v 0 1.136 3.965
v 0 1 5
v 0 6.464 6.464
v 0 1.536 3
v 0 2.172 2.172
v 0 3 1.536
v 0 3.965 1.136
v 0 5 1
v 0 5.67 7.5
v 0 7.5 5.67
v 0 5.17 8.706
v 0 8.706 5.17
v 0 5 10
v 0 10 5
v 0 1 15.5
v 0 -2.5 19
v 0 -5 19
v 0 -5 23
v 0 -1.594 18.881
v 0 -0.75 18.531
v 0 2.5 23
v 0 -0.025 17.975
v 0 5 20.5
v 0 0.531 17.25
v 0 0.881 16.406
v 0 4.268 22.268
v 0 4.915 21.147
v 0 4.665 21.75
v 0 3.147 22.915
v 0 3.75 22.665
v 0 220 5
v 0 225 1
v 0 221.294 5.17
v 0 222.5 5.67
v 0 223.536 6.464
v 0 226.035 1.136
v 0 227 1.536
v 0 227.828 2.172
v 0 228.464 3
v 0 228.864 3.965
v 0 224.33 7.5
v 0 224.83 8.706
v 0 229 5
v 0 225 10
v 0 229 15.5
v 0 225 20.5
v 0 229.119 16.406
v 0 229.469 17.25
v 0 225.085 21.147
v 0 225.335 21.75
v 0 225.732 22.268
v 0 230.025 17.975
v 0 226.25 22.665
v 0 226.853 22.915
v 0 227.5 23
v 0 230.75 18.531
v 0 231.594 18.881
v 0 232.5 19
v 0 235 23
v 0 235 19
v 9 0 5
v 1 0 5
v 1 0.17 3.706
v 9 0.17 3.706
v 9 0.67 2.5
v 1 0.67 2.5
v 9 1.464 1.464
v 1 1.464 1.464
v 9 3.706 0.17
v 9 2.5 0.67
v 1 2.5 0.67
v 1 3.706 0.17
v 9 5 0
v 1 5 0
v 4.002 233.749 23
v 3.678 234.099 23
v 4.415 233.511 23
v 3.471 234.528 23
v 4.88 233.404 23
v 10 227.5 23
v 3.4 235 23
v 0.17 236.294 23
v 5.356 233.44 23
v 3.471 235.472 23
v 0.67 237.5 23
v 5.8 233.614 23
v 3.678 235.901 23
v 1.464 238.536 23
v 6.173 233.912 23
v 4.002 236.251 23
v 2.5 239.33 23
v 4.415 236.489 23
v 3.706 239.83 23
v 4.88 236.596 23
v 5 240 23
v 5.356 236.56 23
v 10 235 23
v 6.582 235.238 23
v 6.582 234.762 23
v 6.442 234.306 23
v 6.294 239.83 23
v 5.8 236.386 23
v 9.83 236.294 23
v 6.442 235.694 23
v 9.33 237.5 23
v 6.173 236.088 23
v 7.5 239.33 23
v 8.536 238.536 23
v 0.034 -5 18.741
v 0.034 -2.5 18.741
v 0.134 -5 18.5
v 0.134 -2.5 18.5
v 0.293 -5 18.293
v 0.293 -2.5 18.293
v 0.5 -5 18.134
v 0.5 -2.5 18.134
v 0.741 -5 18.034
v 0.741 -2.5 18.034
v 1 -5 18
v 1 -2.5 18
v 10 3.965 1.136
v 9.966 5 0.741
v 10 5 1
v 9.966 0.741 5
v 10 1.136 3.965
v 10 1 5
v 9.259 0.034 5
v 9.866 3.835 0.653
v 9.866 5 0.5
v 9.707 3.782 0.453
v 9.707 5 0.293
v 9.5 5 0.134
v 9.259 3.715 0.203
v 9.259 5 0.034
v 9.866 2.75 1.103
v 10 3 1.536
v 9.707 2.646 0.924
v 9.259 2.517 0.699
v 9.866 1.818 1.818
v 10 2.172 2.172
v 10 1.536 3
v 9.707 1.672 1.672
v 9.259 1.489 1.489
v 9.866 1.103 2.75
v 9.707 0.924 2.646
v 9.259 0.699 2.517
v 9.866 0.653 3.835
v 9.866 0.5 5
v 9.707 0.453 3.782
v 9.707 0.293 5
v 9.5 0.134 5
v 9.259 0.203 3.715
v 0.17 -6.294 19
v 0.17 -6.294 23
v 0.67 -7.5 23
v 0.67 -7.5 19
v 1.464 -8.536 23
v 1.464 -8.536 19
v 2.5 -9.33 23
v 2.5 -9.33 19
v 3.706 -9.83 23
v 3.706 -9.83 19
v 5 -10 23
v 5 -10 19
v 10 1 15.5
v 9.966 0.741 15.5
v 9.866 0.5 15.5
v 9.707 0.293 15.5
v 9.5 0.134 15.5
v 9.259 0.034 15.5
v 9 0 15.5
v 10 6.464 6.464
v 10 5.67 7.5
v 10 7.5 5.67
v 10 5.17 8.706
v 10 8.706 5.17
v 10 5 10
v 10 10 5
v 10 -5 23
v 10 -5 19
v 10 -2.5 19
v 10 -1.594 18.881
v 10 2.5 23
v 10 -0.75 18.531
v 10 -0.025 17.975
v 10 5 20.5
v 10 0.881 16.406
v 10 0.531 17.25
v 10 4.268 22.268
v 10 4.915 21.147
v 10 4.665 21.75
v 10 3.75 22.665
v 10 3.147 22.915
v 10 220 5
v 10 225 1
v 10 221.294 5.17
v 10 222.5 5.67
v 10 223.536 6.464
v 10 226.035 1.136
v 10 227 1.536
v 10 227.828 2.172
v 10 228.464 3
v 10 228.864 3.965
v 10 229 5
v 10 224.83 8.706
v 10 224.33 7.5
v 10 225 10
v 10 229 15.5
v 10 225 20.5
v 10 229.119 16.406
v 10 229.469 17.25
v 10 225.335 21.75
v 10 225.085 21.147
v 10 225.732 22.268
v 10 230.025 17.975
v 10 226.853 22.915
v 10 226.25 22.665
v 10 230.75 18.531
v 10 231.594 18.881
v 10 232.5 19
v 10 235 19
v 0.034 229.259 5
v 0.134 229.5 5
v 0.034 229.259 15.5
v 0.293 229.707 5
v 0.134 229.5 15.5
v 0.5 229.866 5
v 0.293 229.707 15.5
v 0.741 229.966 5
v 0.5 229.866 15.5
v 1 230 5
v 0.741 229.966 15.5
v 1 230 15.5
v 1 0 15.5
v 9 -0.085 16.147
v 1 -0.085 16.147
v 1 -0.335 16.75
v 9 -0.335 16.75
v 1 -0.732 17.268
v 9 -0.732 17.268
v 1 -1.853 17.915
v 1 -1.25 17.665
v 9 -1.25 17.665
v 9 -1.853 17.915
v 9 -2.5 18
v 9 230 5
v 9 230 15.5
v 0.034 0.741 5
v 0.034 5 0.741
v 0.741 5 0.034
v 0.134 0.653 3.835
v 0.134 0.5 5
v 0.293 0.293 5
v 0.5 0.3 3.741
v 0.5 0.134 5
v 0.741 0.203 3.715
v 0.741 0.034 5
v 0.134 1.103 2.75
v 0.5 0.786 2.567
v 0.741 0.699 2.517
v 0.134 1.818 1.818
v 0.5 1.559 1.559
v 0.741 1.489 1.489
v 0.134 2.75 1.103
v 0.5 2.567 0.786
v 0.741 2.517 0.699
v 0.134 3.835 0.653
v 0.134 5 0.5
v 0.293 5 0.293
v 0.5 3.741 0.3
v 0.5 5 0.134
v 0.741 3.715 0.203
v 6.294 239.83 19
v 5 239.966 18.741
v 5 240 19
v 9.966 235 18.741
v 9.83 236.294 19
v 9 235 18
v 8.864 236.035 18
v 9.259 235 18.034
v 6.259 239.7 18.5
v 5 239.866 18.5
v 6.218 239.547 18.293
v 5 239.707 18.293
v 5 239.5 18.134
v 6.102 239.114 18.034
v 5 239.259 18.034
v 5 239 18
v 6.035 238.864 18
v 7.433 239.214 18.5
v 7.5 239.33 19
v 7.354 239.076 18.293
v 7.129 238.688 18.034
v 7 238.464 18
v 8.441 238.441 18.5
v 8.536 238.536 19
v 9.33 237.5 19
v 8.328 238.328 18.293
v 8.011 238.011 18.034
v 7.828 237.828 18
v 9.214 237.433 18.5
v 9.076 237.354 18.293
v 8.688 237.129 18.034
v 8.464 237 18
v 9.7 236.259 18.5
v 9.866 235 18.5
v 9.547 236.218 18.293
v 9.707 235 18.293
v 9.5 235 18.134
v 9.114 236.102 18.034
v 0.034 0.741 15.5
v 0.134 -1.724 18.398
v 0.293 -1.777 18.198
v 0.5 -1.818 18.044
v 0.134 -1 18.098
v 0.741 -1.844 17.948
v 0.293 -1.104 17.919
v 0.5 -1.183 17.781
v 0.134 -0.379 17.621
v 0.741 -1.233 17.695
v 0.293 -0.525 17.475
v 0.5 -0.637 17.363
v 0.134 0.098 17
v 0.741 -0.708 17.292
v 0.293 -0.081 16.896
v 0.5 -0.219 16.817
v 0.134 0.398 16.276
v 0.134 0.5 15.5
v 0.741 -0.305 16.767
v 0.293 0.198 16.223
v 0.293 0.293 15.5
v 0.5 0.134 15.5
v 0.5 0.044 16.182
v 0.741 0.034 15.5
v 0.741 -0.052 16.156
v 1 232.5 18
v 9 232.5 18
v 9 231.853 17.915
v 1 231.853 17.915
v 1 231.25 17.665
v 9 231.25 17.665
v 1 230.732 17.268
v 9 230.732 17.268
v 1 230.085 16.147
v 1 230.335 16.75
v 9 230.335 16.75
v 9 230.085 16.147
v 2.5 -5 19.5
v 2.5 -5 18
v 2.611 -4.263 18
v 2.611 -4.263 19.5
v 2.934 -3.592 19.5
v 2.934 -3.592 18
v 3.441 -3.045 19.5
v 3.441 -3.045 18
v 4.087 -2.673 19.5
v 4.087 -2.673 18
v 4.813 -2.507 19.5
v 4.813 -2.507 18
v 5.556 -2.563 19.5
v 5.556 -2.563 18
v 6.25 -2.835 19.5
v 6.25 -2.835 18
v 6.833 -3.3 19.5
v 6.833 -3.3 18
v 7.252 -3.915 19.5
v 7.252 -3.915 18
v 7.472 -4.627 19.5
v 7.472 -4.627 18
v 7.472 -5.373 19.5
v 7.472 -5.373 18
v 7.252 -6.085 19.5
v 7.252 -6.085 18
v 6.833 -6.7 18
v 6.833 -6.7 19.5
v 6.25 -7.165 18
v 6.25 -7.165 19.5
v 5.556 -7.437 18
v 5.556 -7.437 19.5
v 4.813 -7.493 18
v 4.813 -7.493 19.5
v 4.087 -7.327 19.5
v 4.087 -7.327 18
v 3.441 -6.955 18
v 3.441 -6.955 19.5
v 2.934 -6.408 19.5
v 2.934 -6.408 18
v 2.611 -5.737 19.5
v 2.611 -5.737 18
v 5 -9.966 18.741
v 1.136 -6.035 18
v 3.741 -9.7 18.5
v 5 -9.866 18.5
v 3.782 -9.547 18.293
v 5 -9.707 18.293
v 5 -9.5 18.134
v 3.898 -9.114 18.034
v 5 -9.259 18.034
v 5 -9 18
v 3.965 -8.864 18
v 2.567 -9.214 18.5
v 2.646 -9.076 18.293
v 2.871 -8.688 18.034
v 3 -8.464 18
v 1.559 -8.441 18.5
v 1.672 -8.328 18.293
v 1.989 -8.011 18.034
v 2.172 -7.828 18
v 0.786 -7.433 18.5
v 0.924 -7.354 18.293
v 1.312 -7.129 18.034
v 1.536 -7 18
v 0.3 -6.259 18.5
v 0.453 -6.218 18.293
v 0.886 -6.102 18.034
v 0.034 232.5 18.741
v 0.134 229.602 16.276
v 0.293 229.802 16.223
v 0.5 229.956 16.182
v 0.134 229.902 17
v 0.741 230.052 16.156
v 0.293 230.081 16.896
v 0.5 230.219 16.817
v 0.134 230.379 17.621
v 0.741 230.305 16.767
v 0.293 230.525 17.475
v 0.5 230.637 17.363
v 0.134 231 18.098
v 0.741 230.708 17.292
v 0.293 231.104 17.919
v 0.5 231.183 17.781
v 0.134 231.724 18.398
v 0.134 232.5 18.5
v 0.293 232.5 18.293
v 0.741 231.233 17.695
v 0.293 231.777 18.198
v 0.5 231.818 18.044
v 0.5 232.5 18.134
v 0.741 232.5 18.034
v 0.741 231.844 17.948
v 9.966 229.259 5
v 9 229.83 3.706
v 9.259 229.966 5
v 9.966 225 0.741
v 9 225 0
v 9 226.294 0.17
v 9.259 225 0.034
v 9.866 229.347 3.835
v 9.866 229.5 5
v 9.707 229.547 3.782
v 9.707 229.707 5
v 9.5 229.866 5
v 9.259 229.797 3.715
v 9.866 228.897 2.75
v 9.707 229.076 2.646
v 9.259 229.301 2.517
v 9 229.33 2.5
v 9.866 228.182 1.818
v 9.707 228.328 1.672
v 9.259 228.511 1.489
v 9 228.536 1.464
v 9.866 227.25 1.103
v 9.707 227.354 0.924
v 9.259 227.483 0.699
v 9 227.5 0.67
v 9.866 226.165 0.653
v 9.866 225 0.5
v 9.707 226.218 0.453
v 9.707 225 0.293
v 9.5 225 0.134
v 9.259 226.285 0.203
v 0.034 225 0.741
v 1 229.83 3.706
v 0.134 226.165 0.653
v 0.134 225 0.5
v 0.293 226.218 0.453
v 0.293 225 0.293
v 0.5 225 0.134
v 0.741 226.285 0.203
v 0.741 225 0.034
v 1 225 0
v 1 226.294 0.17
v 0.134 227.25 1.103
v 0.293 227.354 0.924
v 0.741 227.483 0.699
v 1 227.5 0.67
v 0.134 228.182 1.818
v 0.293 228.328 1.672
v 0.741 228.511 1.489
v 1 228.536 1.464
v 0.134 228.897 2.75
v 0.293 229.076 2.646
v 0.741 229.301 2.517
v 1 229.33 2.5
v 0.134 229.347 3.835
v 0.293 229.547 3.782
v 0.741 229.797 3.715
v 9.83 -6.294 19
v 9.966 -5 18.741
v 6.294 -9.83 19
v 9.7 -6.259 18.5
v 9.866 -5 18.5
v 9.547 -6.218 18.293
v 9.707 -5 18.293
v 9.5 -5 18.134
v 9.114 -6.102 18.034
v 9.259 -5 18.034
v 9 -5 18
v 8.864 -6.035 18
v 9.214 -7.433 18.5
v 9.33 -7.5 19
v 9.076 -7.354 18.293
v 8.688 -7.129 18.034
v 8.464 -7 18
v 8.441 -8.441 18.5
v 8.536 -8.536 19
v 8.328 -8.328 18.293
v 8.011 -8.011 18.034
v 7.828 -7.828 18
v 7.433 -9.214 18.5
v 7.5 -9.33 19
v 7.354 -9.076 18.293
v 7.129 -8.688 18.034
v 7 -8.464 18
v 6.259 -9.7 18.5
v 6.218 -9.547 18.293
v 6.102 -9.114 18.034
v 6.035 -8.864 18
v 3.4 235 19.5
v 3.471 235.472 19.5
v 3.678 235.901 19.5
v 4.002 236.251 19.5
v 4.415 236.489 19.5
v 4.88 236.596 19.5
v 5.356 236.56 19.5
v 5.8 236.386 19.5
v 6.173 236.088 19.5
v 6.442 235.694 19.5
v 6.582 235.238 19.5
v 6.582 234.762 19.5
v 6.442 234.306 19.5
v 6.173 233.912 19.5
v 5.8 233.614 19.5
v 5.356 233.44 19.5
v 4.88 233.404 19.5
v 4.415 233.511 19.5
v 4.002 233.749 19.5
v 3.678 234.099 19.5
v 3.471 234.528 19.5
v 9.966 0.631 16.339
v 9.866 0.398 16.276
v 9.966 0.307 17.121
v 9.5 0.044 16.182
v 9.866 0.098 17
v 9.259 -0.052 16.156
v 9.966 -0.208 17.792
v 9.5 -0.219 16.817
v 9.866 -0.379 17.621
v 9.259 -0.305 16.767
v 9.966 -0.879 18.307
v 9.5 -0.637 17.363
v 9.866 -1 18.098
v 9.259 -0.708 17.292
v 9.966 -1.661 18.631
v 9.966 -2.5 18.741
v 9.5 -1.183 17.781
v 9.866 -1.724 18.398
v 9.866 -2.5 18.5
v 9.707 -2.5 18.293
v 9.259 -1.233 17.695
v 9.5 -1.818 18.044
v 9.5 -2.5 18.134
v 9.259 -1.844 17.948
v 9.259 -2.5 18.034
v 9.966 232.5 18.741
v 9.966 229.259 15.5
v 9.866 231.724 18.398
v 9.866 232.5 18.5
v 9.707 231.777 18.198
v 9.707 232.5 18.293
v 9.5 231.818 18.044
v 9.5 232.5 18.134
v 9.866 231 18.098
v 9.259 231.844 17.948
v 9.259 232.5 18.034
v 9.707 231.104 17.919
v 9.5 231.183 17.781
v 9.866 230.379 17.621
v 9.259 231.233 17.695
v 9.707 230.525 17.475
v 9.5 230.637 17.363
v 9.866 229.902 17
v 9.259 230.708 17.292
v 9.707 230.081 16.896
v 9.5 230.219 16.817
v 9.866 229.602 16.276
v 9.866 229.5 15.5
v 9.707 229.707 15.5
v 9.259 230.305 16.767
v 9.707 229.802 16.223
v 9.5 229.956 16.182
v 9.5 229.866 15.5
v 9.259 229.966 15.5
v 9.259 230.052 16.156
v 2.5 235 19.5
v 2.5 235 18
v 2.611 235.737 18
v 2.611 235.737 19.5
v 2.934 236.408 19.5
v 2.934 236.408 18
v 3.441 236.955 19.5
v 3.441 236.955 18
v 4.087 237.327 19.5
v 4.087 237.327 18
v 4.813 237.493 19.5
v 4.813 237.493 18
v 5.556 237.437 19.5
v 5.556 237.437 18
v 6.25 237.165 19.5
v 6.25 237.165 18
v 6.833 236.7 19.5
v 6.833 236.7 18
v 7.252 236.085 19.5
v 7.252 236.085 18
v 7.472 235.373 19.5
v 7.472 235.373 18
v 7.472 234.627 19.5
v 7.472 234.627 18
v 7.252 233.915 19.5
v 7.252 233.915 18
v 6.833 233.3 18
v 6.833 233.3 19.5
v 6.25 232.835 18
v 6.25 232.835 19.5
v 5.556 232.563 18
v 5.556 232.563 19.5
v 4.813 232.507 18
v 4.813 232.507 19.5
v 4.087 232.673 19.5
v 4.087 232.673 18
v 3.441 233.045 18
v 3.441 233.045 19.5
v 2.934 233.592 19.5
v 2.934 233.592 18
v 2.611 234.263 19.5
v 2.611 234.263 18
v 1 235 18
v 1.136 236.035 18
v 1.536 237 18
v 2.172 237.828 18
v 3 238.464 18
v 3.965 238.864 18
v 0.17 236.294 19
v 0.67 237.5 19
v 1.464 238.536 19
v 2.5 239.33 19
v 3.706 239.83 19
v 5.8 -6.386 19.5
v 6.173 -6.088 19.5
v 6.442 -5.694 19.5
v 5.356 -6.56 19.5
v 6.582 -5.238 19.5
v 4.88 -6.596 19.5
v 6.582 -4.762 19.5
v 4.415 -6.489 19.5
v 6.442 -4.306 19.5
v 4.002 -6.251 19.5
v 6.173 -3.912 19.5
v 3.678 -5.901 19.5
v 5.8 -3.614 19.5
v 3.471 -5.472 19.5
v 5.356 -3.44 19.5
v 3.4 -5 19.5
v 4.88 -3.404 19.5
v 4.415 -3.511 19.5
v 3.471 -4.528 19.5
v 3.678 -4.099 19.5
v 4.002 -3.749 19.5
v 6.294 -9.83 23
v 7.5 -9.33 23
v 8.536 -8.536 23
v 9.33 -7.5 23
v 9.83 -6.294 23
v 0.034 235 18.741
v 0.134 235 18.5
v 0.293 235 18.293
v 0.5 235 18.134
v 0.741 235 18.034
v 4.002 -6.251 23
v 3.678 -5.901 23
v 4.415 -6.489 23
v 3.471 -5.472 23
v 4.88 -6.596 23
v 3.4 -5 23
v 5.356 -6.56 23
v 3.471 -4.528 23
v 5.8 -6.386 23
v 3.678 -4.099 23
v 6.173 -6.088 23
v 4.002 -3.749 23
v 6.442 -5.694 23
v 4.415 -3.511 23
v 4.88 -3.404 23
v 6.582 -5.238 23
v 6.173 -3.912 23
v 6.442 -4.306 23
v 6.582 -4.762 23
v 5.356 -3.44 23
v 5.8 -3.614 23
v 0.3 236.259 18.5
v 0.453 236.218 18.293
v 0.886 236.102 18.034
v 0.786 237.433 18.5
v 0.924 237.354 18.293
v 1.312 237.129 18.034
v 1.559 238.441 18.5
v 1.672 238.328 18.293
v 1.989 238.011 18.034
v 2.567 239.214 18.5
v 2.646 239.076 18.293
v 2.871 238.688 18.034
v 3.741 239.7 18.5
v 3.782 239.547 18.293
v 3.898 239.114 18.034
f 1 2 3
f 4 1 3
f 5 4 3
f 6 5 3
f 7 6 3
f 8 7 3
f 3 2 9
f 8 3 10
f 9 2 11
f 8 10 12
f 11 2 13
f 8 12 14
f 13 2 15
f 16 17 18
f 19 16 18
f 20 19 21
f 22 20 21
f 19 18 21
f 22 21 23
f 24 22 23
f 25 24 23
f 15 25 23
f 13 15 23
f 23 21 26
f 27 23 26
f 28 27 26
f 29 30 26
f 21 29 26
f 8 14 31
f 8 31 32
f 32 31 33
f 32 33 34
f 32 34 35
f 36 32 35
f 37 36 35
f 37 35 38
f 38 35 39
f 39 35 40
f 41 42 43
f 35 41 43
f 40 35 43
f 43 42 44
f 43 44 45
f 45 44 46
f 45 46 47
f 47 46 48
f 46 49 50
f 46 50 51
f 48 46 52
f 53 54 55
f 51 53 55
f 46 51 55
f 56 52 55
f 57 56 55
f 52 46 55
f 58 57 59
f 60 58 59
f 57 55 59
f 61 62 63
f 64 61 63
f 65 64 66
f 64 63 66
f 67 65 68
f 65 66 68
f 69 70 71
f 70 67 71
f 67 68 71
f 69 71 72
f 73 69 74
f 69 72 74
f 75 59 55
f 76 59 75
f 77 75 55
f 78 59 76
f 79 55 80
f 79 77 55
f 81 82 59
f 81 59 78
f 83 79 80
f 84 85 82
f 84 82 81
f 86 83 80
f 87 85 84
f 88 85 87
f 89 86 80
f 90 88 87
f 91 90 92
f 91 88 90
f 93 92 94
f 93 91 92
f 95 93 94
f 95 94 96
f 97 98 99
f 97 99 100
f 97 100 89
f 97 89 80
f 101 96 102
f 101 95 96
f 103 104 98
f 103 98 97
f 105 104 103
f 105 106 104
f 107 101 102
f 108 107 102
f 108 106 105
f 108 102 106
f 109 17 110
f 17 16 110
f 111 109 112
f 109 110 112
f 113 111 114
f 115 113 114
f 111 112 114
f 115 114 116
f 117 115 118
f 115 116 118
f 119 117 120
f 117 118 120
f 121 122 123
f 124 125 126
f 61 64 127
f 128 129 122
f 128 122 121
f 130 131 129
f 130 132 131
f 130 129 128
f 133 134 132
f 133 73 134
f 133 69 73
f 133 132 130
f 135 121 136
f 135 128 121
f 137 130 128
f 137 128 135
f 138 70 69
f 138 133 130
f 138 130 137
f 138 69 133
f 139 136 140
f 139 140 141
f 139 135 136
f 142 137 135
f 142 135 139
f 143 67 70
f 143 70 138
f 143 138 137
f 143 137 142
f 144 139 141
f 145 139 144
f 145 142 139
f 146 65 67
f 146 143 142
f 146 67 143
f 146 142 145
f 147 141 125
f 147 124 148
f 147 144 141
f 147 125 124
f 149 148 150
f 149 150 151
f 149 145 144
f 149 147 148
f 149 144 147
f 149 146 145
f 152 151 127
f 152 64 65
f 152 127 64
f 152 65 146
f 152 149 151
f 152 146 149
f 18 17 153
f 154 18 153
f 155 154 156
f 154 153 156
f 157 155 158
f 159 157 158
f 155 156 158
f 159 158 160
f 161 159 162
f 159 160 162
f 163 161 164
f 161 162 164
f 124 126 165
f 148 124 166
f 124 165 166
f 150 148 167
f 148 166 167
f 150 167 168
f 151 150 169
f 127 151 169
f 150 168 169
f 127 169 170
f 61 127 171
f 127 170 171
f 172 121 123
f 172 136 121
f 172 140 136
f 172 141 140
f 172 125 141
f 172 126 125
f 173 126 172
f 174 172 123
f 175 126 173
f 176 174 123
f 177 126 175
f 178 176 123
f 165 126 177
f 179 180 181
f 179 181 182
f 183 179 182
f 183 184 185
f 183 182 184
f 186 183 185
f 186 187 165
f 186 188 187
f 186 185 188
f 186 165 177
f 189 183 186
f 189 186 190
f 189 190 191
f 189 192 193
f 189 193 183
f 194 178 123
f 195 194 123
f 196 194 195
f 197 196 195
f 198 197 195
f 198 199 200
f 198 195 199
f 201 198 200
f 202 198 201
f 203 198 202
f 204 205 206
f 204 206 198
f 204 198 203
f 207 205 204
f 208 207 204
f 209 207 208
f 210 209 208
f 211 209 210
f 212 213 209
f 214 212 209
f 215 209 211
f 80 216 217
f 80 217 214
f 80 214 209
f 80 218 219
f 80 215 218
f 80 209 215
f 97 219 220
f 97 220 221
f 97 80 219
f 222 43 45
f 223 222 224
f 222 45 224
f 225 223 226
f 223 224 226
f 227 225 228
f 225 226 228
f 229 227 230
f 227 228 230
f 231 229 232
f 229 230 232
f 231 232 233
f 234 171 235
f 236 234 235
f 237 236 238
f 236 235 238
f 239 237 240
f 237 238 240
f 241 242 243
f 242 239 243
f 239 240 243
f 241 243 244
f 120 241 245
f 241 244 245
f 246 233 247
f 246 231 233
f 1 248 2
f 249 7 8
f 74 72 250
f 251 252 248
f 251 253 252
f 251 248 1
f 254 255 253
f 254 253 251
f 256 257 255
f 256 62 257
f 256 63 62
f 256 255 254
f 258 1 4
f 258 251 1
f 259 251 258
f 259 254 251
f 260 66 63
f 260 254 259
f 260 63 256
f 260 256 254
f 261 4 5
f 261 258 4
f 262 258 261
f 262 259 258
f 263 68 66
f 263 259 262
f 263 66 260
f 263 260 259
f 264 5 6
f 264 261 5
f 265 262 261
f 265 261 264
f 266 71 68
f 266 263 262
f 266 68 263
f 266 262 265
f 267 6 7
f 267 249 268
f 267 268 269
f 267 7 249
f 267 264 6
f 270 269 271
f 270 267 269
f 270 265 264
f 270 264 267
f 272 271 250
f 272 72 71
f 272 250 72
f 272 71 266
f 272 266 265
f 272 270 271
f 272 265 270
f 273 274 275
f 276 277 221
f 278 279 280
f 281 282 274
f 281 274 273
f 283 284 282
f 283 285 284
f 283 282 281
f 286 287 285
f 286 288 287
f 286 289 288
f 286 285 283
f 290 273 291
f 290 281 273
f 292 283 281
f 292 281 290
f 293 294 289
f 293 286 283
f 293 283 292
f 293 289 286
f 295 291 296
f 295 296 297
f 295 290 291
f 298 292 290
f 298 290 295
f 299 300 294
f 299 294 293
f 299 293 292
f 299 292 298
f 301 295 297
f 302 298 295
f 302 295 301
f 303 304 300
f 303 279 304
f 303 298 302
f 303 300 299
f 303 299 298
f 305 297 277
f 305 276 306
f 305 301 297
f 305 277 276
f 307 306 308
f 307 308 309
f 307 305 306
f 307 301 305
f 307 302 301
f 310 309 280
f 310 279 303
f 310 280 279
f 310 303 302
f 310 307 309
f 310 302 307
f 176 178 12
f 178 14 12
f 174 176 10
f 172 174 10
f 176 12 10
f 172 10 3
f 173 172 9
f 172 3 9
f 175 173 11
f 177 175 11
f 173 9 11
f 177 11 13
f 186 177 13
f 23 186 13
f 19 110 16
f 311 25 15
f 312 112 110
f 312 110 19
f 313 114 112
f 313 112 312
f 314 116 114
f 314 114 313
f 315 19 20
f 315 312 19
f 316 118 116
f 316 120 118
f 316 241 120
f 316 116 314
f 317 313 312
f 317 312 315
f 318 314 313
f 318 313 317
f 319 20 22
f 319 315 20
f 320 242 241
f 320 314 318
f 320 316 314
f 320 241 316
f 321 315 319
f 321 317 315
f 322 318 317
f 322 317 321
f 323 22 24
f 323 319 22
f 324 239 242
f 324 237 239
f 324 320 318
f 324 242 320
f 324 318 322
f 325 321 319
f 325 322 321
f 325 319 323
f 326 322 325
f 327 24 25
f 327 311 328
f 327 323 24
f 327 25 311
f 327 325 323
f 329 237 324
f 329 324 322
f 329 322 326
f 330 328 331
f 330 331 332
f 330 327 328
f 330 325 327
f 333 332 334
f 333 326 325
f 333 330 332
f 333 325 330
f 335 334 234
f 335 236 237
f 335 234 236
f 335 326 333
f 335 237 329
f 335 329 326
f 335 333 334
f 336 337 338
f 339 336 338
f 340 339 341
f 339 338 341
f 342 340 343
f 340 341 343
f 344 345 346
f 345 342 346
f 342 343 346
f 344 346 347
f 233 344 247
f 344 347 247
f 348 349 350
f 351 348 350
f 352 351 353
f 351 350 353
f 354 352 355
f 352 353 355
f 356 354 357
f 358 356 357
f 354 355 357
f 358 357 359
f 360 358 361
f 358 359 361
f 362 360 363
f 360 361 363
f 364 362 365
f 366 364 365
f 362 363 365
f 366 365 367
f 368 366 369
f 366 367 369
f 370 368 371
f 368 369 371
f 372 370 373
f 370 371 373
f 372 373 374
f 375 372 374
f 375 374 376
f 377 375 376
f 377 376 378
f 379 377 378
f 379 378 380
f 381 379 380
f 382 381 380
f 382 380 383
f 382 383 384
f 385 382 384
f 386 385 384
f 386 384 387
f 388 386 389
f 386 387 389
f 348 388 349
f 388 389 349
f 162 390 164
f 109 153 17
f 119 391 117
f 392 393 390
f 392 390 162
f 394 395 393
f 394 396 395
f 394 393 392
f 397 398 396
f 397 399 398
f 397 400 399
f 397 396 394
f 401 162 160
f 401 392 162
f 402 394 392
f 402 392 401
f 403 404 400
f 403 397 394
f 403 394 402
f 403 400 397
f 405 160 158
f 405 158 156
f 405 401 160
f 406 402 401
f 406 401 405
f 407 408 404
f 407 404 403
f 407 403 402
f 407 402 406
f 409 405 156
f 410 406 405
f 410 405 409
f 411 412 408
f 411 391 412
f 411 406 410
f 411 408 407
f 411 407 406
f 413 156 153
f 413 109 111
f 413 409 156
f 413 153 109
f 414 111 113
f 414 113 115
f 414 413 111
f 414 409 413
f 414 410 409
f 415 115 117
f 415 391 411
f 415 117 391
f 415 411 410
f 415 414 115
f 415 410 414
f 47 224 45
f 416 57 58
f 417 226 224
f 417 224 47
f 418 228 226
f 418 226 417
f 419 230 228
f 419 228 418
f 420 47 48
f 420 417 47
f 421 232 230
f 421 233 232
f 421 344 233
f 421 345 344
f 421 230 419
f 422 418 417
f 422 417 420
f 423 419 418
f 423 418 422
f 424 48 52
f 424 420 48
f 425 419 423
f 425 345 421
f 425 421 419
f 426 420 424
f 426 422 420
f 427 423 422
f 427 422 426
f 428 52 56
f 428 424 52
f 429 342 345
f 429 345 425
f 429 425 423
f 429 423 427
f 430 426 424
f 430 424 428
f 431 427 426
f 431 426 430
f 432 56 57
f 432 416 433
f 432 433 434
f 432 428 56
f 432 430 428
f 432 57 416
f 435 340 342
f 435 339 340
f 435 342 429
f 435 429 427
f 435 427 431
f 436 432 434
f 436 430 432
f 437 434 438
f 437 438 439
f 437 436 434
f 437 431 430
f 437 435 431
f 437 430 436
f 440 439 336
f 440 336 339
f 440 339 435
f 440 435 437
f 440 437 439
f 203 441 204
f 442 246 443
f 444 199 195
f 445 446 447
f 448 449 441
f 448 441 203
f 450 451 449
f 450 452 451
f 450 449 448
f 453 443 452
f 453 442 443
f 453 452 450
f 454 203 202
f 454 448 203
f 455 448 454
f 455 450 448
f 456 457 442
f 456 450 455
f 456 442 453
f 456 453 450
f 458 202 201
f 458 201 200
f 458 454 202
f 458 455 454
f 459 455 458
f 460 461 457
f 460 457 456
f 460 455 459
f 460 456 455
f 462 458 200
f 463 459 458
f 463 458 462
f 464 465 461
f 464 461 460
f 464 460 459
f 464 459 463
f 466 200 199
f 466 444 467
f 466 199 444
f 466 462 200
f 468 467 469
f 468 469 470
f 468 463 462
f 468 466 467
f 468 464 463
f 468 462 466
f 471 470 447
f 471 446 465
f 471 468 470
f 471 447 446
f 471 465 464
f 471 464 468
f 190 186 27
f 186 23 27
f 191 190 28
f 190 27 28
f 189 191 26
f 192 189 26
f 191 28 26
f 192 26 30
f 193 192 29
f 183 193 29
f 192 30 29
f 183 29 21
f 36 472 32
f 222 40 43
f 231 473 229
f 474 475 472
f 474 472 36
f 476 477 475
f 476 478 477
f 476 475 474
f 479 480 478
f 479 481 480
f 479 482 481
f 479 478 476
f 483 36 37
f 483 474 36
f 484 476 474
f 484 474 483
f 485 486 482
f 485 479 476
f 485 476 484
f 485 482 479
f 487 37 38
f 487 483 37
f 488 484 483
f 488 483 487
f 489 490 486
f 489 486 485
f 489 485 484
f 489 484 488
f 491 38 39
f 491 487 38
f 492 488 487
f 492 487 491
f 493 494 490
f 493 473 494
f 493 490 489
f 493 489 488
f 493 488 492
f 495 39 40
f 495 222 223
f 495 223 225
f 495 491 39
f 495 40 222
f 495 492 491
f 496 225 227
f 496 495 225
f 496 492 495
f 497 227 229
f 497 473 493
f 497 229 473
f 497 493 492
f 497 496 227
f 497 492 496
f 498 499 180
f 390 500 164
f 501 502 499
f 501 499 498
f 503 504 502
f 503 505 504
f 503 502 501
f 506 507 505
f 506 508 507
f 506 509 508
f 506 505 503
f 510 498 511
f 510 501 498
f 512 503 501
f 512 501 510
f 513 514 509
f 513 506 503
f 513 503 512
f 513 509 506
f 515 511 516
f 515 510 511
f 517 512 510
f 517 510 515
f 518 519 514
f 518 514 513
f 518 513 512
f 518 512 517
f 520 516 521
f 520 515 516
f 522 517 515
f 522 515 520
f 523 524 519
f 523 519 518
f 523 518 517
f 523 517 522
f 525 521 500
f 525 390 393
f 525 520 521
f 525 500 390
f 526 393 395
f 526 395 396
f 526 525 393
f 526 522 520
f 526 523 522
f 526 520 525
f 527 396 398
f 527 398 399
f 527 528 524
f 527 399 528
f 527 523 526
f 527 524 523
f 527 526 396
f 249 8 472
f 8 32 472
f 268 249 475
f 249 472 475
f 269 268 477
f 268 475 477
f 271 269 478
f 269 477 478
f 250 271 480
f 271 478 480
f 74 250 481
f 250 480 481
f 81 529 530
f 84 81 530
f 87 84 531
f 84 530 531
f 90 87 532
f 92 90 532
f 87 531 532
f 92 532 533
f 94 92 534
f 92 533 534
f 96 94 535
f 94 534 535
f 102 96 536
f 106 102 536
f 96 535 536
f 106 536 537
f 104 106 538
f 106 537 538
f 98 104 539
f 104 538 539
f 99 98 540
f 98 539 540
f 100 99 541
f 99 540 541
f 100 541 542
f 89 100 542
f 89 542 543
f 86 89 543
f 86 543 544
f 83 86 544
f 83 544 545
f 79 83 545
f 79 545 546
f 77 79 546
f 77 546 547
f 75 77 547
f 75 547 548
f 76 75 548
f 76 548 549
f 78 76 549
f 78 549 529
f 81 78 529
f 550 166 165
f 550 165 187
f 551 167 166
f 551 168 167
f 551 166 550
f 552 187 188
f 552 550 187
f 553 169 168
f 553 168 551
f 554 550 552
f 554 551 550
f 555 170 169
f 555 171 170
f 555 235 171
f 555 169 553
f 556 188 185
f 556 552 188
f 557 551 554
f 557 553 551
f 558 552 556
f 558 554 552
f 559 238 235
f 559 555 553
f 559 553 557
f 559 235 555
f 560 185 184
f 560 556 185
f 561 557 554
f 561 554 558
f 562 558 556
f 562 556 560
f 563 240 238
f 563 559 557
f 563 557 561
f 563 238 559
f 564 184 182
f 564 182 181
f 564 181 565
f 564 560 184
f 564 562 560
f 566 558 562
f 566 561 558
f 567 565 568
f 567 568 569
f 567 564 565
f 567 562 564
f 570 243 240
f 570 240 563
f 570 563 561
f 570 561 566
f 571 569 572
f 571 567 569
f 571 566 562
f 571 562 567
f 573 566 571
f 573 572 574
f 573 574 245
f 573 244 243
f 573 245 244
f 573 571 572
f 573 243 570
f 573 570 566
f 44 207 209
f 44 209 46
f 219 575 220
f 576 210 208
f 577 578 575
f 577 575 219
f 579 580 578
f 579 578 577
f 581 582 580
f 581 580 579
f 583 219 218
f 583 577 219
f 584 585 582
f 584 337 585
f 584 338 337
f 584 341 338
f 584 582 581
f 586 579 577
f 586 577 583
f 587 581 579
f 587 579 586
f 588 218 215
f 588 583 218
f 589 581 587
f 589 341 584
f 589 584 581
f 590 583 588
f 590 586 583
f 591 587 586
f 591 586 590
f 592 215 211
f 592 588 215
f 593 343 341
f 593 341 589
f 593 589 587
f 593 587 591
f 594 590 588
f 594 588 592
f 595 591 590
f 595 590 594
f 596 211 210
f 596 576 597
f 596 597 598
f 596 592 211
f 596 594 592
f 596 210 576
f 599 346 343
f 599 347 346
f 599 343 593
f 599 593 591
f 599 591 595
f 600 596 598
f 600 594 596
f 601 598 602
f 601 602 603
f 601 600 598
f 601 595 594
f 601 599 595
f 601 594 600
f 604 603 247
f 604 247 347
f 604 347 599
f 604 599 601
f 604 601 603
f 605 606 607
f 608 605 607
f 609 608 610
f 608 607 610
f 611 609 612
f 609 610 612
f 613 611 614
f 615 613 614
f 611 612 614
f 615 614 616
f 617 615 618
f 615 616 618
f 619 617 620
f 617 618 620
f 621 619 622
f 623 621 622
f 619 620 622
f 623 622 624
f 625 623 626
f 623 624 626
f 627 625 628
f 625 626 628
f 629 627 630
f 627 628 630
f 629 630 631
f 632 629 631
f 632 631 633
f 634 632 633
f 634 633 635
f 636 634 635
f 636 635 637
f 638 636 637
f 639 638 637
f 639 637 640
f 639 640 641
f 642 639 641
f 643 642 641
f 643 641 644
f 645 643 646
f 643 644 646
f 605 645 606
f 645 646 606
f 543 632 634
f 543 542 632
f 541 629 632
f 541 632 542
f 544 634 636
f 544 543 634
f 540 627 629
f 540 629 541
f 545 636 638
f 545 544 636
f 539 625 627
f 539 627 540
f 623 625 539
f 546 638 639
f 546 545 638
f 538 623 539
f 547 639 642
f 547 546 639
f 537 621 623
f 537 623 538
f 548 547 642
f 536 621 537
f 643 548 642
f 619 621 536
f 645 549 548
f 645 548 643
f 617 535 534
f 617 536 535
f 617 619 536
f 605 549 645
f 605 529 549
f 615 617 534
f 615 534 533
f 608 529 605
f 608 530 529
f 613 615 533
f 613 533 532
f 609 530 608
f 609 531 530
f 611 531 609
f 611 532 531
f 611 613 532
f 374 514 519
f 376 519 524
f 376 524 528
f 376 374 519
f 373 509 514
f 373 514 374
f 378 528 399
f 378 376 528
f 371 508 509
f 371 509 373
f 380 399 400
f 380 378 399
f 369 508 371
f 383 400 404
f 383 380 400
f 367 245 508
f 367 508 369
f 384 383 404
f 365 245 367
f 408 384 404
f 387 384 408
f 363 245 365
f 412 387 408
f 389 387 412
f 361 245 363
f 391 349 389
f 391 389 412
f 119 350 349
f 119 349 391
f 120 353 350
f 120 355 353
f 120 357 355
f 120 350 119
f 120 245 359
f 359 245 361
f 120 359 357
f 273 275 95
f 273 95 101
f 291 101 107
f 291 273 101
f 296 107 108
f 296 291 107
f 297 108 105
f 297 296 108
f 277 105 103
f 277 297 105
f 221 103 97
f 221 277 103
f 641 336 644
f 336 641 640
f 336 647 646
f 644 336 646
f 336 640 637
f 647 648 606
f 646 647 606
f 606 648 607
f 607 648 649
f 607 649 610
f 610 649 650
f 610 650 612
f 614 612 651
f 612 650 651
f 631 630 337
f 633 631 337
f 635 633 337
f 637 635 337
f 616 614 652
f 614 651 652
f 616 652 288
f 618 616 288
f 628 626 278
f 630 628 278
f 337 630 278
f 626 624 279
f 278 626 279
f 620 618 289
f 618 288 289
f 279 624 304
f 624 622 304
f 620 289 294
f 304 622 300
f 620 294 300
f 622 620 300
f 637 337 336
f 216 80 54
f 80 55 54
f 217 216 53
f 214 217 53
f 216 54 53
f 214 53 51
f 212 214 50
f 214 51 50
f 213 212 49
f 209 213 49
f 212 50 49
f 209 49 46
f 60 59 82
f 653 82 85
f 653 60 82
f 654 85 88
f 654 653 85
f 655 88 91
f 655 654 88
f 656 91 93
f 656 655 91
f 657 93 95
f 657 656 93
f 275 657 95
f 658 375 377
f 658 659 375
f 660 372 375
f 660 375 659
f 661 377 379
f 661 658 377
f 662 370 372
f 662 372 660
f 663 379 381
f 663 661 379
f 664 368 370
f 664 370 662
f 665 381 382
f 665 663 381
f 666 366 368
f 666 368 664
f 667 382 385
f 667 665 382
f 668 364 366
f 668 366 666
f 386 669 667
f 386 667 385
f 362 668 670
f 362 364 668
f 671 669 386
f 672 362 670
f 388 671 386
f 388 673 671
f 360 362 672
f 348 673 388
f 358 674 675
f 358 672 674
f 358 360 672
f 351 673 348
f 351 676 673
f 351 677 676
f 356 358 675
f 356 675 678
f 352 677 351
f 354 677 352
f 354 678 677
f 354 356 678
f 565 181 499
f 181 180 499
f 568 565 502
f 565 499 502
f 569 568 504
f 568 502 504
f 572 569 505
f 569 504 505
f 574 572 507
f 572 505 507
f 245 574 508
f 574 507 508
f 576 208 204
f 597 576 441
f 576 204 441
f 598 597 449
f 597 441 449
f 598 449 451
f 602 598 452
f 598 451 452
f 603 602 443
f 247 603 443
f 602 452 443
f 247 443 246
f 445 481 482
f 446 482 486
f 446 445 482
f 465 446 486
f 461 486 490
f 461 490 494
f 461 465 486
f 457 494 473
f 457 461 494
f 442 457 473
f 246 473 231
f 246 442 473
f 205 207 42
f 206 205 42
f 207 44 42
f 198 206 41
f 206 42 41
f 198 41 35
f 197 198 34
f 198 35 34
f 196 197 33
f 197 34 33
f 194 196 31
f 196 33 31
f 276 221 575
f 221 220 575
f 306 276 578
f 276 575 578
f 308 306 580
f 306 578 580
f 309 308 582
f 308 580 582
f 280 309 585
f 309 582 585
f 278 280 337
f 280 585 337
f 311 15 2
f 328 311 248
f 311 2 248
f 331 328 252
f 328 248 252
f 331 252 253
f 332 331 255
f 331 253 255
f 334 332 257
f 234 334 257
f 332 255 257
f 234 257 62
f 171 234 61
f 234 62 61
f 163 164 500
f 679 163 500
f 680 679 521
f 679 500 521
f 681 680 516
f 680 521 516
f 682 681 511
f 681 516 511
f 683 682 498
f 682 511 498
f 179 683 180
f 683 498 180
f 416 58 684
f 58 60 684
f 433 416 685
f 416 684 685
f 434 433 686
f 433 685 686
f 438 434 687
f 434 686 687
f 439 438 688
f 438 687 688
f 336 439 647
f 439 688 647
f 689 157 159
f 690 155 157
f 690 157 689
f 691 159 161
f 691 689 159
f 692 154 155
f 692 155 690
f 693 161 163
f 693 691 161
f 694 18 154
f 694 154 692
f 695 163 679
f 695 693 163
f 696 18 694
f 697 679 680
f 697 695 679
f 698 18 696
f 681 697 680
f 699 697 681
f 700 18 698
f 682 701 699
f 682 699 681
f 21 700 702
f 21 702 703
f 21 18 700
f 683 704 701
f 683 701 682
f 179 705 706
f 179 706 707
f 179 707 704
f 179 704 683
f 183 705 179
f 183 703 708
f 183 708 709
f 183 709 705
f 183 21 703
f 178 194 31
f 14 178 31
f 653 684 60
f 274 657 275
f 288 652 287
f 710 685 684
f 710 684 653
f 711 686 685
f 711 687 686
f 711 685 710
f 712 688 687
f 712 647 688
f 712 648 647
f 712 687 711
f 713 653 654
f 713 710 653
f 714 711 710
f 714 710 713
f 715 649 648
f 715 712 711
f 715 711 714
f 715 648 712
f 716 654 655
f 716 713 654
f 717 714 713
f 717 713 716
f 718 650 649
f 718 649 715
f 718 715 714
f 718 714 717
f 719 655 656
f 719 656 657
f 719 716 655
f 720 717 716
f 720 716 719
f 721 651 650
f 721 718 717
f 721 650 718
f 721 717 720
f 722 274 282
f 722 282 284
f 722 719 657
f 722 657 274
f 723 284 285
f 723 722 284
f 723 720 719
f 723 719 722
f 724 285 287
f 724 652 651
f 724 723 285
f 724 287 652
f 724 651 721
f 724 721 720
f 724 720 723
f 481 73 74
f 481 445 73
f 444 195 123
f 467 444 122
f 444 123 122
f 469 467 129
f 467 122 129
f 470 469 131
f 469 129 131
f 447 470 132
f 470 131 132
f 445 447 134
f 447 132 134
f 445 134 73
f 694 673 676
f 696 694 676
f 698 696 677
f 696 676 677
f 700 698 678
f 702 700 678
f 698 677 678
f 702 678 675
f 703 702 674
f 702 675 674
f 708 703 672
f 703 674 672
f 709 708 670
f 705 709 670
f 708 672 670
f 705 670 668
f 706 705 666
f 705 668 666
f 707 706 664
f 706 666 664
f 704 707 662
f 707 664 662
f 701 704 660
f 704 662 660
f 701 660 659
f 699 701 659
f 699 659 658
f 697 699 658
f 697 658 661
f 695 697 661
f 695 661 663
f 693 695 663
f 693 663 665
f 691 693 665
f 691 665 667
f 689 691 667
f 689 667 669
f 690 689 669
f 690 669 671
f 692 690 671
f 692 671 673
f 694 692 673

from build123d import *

# Parameters (mm, degrees)
BOSS_EXTRUDE1_DEPTH = 5
BOSS_EXTRUDE2_DEPTH = 18
SKETCH3_W           = 9.999999999999972
SKETCH3_H           = 10
BOSS_EXTRUDE3_DEPTH = 5
SKETCH4_R           = 1.5999999999999999
SKETCH4_R_2         = 1.599999999999992
CUT_EXTRUDE1_DEPTH  = 241.88171371027735
SKETCH5_R           = 2.5000000000000004
SKETCH5_R_2         = 2.500000000000001
CUT_EXTRUDE2_DEPTH  = 1.5
FILLET1_R           = 5
FILLET2_R           = 2.5
FILLET3_R           = 1


with BuildPart() as part:
    # Sketch1 → Boss-Extrude1 (new body)
    with BuildSketch(Plane.XY):
        Polygon((0, 0), (0, 230), (9.999999999999972, 230), (10, -7.8e-16), align=None)
    extrude(amount=BOSS_EXTRUDE1_DEPTH)

    # Sketch2 → Boss-Extrude2 (add)
    with BuildSketch(Plane.XY.offset(5)):
        Polygon((0, 0), (10, -7.8e-16), (10, 4.999999999999999), (0, 5.000000000000004), align=None)
        Polygon((0, 230), (9.999999999999972, 230), (10, 225), (0, 225), align=None)
    extrude(amount=BOSS_EXTRUDE2_DEPTH)

    # Sketch3 → Boss-Extrude3 (add)
    with BuildSketch(Plane.XY.offset(23)):
        with Locations((4.999999999999986, 235.00000000000003)):
            Rectangle(SKETCH3_W, SKETCH3_H)
        Polygon((0, 0), (10, -7.8e-16), (10.000000000000002, -10), (0, -10.000000000000002), align=None)
    extrude(amount=-BOSS_EXTRUDE3_DEPTH)

    # Sketch4 → Cut-Extrude1 (cut, through all)
    with BuildSketch(Plane(origin=(0, 0, 18), x_dir=(-1, 0, 0), z_dir=(0, 0, -1))):
        with Locations((-5, -5.000000000000002)):
            Circle(SKETCH4_R)
        with Locations((-5, 235.00000000000003)):
            Circle(SKETCH4_R_2)
    extrude(amount=-CUT_EXTRUDE1_DEPTH, mode=Mode.SUBTRACT)

    # Sketch5 → Cut-Extrude2 (cut)
    with BuildSketch(Plane(origin=(0, 0, 18), x_dir=(-1, 0, 0), z_dir=(0, 0, -1))):
        with Locations((-5, -5.000000000000002)):
            Circle(SKETCH5_R)
        with Locations((-5, 235.00000000000003)):
            Circle(SKETCH5_R_2)
    extrude(amount=-CUT_EXTRUDE2_DEPTH, mode=Mode.SUBTRACT)

    # Fillet1
    fillet1_edges = [part.edges().sort_by_distance(p)[0] for p in [
        (0, -10.000000000000002, 20.5),
        (10.000000000000002, -10, 20.5),
        (0, 240.00000000000003, 20.5),
        (9.999999999999972, 240.00000000000003, 20.5),
        (5, 225, 5),
        (4.999999999999986, 230, 0),
        (5, 5.000000000000002, 5),
        (5, -3.9e-16, 0),
    ]]
    fillet(fillet1_edges, radius=FILLET1_R - 0.0001)  # a hair under: the kernel refuses the full size

    # Fillet2
    fillet2_edges = [part.edges().sort_by_distance(p)[0] for p in [
        (5, 5.000000000000002, 23),
        (5, 225, 23),
        (4.999999999999986, 230, 18),
        (5, -3.9e-16, 18),
    ]]
    fillet(fillet2_edges, radius=FILLET2_R)

    # Fillet3
    fillet3_edges = [part.edges().sort_by_distance(p)[0] for p in [
        (0, 115, 0),
        (0, 233.75005000000002, 18),
        (-2.7e-16, 1.4644368047453802, 1.4644368047453806),
        (0, 228.5355631952546, 1.4644368047453806),
        (10, -3.7500500000000008, 18),
        (8.53556319525462, -8.535563195254621, 18),
        (1.464436804745381, -8.53556319525462, 18),
        (9.999999999999986, 115, 0),
        (10, 1.4644368047453793, 1.4644368047453806),
        (9.999999999999972, 228.5355631952546, 1.4644368047453806),
        (8.53556319525459, 238.53556319525464, 18),
        (1.4644368047453793, 238.53556319525464, 18),
        (10, -7.8e-16, 10.249949999999998),
        (9.999999999999972, 230, 10.24995),
        (9.999999999999972, 233.75005000000002, 18),
        (0, -3.75005, 18),
        (0, 230, 10.24995),
        (0, 0, 10.249949999999998),
        (9.999999999999972, 230.73223304703362, 17.26776695296637),
        (0, 230.73223304703362, 17.26776695296637),
        (1.4e-16, -0.7322330470336309, 17.26776695296637),
        (10, -0.7322330470336316, 17.26776695296637),
    ]]
    fillet(fillet3_edges, radius=FILLET3_R)


solid = part.part
